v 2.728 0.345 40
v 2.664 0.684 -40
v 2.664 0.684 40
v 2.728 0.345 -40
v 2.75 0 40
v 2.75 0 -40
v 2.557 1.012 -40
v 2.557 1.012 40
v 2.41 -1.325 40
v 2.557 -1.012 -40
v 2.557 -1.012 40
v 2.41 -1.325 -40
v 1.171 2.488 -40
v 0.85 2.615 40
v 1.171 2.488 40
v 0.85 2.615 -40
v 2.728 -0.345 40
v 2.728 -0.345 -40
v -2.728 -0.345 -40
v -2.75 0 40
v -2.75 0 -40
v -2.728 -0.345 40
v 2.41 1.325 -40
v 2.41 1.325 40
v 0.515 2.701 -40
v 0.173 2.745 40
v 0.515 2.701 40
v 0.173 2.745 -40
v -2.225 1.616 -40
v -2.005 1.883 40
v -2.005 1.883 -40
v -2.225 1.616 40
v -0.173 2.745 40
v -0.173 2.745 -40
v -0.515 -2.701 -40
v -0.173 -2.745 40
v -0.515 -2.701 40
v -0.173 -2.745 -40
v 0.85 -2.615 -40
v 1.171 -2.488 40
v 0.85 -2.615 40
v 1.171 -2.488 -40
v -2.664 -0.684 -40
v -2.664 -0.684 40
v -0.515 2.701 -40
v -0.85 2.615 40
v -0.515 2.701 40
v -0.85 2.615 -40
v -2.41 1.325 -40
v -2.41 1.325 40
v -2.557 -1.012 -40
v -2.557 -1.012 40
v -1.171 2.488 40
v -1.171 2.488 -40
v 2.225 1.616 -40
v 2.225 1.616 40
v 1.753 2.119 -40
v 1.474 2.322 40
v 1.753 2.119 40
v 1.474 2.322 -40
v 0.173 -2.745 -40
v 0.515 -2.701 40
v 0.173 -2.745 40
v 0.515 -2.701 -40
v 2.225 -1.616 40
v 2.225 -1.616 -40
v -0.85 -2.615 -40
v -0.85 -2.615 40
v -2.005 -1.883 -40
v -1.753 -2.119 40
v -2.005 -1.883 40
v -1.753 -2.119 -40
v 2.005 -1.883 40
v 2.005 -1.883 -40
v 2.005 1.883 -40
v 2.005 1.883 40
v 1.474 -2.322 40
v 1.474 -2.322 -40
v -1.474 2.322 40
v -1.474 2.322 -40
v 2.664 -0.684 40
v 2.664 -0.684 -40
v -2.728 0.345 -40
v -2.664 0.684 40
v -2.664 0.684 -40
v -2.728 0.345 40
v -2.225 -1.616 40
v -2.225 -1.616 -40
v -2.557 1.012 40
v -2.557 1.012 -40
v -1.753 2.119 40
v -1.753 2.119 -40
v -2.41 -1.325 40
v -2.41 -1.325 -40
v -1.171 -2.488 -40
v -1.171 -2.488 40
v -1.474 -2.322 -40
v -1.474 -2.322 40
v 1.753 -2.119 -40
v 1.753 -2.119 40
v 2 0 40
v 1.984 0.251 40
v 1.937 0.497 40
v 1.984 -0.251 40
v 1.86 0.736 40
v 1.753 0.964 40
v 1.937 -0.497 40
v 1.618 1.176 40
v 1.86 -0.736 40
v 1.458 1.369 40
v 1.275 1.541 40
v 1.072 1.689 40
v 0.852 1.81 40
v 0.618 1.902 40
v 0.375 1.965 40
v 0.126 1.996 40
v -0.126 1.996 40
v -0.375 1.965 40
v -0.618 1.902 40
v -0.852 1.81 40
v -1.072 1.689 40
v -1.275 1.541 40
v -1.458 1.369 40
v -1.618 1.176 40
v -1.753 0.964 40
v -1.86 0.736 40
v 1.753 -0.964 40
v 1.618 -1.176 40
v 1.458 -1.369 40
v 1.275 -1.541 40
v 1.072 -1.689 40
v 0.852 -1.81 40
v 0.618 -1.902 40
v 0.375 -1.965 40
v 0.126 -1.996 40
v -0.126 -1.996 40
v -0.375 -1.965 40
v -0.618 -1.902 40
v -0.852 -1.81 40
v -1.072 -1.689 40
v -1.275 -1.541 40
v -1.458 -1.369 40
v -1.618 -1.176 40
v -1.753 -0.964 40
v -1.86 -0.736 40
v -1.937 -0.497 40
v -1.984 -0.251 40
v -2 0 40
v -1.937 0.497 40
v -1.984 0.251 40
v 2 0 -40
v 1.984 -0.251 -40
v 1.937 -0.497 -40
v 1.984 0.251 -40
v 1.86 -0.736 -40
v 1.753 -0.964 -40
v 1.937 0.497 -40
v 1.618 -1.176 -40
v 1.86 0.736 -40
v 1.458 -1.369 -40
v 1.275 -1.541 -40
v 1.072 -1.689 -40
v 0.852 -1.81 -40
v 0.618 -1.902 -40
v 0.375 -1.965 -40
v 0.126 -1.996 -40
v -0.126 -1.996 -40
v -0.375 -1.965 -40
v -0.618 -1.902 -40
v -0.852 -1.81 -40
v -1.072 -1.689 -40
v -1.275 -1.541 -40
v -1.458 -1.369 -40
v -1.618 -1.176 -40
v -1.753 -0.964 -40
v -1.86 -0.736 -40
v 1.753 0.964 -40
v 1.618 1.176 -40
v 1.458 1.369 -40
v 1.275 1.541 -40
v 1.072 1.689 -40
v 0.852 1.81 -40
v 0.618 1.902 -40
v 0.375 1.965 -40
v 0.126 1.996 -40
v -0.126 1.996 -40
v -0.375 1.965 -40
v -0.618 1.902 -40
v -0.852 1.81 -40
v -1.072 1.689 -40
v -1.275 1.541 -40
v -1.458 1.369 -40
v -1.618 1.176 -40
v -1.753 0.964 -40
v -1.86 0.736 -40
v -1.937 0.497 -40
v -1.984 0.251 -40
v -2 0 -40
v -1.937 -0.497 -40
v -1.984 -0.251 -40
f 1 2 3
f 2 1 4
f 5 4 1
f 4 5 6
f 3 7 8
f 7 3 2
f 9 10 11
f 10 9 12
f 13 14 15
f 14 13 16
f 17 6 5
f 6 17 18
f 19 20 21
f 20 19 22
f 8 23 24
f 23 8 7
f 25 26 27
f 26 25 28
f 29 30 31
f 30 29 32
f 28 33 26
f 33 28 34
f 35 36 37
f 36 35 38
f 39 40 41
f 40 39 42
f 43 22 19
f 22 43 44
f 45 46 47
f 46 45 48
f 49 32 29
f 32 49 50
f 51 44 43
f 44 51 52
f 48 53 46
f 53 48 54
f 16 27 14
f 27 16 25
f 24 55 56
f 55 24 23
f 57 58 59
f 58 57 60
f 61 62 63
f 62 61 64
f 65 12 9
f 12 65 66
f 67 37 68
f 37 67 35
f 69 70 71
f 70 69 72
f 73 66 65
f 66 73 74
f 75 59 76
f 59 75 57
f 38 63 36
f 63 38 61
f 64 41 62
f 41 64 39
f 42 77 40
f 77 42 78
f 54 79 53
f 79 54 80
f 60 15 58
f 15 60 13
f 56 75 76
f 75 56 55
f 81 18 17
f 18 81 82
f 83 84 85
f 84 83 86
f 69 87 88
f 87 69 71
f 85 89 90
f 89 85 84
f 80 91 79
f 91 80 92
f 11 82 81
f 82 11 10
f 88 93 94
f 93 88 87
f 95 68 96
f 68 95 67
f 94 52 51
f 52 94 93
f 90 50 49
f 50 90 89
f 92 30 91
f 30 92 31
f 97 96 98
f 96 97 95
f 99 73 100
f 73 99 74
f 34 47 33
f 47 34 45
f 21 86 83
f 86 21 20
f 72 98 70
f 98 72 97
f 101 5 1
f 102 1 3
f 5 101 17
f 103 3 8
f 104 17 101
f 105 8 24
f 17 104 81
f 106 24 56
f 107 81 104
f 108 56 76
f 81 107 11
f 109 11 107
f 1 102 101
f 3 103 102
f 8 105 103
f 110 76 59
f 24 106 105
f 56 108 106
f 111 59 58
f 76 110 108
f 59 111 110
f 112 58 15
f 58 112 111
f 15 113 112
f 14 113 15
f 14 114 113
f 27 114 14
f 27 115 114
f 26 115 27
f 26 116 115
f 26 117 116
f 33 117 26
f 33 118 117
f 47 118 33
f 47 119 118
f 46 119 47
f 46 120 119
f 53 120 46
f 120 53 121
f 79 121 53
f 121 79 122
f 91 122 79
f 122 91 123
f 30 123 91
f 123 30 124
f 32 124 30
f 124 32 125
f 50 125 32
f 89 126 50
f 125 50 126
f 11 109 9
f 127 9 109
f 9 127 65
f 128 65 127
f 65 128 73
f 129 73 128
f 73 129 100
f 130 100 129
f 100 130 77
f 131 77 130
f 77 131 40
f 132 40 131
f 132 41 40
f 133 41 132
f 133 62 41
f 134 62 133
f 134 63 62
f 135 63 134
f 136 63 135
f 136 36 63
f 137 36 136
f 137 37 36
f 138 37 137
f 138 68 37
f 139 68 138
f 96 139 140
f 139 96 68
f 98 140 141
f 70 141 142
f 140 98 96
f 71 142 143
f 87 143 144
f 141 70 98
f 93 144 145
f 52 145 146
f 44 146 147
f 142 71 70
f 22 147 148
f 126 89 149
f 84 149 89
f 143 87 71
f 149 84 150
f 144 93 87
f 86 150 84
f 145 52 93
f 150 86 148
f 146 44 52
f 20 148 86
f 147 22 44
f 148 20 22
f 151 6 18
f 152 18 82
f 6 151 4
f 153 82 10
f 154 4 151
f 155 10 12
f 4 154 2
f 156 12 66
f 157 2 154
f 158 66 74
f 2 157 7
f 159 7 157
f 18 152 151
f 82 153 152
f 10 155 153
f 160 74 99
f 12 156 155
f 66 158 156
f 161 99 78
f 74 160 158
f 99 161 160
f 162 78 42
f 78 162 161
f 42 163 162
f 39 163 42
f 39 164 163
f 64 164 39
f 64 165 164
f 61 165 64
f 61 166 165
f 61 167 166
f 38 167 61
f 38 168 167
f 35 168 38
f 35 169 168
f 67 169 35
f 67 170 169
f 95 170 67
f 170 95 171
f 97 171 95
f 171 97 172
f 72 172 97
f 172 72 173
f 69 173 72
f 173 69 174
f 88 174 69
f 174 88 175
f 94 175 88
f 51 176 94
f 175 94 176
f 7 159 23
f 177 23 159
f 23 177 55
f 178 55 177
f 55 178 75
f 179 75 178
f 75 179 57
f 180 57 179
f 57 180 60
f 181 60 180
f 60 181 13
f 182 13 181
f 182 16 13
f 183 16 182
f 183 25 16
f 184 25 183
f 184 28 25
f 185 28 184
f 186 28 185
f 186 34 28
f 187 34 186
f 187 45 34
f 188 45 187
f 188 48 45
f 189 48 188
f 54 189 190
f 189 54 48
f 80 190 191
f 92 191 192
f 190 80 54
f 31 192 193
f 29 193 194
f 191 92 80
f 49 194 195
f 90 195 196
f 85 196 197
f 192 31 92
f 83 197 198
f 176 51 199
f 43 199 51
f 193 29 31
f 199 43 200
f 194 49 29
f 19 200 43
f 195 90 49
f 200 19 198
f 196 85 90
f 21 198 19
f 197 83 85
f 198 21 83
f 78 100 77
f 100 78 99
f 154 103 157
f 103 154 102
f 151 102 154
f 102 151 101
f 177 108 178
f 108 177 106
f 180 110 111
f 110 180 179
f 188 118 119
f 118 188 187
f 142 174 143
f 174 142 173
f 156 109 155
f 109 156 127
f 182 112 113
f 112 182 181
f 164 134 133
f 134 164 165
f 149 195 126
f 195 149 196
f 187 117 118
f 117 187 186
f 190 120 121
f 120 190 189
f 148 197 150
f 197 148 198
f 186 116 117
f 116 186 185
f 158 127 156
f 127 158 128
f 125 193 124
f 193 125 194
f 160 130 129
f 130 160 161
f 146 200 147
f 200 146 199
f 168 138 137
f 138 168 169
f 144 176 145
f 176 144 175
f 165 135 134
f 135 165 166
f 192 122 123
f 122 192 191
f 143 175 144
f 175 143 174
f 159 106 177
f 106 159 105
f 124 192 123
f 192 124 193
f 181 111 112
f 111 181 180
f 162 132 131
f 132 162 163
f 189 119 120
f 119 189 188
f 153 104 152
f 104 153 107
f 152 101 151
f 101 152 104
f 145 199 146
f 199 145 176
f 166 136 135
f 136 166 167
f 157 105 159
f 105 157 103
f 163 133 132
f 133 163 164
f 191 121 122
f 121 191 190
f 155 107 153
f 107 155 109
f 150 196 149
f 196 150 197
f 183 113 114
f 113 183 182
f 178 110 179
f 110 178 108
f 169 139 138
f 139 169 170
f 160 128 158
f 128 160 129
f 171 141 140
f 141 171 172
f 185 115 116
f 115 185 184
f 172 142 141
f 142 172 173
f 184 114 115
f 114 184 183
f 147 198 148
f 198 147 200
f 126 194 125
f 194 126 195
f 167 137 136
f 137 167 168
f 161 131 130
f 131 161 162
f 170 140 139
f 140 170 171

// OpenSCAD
$fn = 50;


difference() {
	union() {
		translate(v = [0, 0, -40.0000000000]) {
			cylinder(h = 80, r = 2.7500000000);
		}
	}
	union() {
		translate(v = [0, 0, -100.0000000000]) {
			cylinder(h = 200, r = 2.0000000000);
		}
	}
}
